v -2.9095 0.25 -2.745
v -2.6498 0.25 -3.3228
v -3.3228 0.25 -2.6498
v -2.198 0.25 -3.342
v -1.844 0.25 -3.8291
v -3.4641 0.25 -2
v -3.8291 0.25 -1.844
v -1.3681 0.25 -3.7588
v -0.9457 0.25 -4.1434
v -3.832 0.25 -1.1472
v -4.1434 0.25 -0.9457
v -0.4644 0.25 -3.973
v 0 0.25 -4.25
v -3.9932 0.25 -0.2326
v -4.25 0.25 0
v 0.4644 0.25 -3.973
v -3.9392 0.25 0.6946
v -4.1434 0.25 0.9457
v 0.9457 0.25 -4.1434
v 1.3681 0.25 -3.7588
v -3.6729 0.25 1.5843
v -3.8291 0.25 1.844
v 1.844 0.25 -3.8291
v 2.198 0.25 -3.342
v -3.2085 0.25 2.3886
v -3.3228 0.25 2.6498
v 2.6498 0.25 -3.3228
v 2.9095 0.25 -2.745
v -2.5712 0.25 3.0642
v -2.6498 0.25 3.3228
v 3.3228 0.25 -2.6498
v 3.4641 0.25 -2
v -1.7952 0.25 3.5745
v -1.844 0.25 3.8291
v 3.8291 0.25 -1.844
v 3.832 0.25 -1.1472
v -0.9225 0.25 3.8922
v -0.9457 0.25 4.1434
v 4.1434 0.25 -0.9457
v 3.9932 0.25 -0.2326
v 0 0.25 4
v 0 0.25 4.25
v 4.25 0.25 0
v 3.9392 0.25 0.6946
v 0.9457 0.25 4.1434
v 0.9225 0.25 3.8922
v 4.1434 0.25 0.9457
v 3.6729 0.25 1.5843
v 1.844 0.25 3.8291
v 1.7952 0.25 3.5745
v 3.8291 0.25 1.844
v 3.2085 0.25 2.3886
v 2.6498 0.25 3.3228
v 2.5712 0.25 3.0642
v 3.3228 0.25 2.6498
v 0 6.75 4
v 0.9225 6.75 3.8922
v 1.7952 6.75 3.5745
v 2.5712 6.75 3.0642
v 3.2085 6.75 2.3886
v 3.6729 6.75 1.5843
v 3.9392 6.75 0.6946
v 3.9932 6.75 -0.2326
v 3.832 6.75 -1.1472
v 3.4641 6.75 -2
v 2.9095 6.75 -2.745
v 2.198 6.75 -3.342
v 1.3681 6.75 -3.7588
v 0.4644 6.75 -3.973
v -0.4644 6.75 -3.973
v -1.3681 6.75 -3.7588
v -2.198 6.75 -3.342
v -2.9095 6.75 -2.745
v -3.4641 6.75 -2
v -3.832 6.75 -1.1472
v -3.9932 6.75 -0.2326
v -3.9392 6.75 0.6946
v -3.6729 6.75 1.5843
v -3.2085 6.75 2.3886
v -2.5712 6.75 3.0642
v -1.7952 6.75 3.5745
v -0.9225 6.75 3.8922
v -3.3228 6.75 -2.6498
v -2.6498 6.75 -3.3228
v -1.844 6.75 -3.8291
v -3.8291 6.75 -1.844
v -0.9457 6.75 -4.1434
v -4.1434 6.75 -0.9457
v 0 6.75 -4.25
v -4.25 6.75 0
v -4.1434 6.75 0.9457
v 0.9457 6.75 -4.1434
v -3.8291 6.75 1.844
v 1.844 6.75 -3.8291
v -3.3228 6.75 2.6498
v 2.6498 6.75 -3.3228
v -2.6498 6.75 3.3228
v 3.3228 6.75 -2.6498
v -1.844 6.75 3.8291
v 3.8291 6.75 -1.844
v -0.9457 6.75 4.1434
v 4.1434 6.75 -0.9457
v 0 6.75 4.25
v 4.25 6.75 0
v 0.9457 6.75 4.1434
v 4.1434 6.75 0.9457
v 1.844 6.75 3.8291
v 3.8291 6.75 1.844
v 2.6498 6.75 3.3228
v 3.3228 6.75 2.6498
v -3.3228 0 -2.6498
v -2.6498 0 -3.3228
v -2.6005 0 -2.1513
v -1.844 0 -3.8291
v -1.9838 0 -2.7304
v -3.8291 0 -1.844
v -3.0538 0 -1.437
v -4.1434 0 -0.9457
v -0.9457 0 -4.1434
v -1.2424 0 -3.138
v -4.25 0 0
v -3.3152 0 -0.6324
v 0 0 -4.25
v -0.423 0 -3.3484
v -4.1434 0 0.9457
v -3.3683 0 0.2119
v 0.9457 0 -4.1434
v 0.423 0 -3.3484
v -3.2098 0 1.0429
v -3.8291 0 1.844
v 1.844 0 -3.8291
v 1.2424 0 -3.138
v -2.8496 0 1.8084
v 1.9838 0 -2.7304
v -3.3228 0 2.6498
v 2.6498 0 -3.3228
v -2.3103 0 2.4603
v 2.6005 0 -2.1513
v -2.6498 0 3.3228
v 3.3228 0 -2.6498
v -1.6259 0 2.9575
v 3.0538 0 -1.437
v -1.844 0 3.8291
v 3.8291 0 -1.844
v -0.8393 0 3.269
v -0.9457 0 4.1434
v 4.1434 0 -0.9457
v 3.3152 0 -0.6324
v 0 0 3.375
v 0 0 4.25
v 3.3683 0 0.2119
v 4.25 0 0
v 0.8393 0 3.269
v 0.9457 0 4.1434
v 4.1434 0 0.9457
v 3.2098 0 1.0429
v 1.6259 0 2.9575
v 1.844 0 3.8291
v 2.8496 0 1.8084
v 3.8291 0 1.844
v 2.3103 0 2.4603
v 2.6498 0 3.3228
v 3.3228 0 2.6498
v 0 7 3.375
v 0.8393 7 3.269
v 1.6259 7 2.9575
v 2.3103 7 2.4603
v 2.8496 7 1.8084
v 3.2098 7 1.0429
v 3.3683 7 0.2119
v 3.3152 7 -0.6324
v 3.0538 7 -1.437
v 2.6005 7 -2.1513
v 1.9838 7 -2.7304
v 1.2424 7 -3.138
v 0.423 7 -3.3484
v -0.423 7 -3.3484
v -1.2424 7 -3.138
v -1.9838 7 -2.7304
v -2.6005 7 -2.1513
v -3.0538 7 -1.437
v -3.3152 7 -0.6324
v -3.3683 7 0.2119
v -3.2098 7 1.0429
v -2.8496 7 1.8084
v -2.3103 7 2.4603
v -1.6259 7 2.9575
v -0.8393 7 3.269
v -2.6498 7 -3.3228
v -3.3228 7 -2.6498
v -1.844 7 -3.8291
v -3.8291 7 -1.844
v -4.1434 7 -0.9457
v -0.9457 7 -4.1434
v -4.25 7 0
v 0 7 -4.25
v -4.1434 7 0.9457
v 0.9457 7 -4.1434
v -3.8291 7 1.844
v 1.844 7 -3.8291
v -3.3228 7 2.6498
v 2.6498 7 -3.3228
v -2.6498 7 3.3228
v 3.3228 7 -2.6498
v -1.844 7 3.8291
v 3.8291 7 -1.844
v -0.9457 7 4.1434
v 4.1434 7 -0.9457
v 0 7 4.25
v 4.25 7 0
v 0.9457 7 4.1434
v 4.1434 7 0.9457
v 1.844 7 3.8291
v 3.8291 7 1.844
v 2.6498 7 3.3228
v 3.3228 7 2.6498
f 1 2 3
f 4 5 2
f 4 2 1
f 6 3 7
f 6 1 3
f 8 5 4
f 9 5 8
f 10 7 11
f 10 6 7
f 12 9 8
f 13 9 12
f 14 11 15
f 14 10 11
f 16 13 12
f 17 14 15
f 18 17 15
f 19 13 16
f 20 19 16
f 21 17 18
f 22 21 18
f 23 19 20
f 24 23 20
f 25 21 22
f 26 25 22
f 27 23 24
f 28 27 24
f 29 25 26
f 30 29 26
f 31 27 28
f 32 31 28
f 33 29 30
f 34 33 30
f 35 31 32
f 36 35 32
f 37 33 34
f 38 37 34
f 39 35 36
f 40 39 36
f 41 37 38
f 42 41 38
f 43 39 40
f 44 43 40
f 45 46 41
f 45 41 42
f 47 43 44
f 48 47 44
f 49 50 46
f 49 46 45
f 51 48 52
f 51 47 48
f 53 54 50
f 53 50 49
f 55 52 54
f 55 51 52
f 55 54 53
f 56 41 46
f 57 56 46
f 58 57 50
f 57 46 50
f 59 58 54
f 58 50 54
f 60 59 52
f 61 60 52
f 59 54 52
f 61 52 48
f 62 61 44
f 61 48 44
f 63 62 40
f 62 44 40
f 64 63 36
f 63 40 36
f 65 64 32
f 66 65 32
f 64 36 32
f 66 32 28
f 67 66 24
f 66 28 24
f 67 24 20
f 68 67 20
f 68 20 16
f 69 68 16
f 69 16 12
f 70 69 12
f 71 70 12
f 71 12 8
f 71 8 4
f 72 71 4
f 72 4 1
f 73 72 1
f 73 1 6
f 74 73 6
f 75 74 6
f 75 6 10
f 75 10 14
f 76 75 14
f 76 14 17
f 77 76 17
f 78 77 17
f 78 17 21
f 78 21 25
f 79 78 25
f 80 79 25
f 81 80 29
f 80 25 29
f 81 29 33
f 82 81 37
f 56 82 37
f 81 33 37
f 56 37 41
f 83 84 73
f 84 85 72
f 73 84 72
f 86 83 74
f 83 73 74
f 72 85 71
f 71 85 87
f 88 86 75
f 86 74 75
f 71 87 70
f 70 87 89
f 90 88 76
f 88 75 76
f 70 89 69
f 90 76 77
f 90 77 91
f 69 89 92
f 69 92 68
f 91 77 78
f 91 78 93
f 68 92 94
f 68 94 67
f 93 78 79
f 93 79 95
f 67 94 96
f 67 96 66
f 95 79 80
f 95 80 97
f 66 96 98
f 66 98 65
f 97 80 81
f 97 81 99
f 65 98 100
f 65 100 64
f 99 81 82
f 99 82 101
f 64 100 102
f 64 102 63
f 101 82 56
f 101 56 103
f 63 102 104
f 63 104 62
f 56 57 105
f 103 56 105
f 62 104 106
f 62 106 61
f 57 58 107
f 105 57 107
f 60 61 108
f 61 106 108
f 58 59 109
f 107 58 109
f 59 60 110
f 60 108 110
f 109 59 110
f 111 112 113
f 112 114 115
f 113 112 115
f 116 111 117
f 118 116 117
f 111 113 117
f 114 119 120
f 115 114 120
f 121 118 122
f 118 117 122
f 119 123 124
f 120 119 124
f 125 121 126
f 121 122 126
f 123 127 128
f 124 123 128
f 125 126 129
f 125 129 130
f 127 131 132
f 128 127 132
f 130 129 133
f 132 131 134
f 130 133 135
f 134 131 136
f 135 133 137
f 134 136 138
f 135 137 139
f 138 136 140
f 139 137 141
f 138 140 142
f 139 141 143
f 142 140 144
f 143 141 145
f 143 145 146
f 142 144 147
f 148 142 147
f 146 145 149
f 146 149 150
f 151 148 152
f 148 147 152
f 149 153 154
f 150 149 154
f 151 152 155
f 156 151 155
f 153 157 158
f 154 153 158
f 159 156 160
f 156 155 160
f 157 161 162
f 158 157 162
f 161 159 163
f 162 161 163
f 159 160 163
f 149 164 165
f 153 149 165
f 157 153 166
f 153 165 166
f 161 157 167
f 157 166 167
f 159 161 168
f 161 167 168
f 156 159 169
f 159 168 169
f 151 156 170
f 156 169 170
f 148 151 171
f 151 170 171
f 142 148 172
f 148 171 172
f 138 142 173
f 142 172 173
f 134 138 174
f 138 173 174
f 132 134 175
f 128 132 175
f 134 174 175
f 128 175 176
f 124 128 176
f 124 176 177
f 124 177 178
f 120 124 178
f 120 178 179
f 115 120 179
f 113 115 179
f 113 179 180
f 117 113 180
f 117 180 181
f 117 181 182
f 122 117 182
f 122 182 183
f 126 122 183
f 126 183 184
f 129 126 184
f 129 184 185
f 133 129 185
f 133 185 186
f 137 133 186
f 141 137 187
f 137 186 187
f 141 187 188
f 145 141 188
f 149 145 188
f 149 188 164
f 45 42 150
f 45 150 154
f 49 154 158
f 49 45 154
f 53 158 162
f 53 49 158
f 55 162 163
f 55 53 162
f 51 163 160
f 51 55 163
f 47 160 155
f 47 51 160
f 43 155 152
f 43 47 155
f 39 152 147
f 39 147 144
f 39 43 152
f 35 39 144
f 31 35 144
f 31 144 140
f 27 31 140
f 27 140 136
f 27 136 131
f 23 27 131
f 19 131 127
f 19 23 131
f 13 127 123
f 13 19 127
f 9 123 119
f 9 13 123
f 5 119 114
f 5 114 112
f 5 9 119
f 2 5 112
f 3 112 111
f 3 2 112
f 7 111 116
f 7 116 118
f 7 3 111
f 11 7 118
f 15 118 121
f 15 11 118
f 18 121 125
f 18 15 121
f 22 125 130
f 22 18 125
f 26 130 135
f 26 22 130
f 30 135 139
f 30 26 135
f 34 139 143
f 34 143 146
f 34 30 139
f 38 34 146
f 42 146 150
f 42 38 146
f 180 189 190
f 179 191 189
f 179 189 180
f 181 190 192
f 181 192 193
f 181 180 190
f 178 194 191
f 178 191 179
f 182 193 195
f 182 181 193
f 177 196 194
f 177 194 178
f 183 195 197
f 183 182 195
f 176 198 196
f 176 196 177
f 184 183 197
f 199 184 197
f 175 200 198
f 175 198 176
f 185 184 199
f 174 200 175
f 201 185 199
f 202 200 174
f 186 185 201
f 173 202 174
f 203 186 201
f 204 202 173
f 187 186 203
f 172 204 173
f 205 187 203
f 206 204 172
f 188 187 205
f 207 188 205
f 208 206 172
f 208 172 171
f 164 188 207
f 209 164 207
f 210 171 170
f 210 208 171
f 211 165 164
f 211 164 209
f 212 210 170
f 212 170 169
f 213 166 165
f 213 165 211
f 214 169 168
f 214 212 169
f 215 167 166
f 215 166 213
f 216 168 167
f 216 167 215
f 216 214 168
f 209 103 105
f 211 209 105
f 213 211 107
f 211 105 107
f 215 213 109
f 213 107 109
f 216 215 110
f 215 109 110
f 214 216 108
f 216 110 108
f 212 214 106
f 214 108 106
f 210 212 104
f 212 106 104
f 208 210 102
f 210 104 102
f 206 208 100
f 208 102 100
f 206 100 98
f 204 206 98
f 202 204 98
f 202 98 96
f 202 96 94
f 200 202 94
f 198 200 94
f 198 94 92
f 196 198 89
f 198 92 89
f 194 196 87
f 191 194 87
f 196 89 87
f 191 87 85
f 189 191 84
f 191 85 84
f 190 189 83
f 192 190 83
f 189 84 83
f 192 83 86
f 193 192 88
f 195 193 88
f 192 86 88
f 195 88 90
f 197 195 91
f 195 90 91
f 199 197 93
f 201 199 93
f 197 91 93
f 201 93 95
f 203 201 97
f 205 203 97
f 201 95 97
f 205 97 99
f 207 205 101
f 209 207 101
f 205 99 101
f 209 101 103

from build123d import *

# Parameters (mm, degrees)
SKETCH1_R           = 4
BOSS_EXTRUDE1_DEPTH = 7
SKETCH2_R           = 3.375
CUT_EXTRUDE1_DEPTH  = 10
BOSS_EXTRUDE2_START = -0.25
SKETCH16_R          = 4.25
SKETCH16_R_2        = 4
BOSS_EXTRUDE2_DEPTH = 0.25


with BuildPart() as part:
    # Sketch1 → Boss-Extrude1 (new body)
    with BuildSketch(Plane(origin=(0, 0, 0), x_dir=(1, 0, 0), z_dir=(0, 1, 0))):
        with Locations(Location((0, 0, 0), (0, 0, 270))):
            Circle(SKETCH1_R)
    extrude(amount=BOSS_EXTRUDE1_DEPTH)

    # Sketch2 → Cut-Extrude1 (cut)
    with BuildSketch(Plane(origin=(0, 7, 0), x_dir=(1, 0, 0), z_dir=(0, 1, 0))):
        with Locations(Location((0, 0, 0), (0, 0, 270))):
            Circle(SKETCH2_R)
    extrude(amount=-CUT_EXTRUDE1_DEPTH, mode=Mode.SUBTRACT)

    # Sketch16 → Boss-Extrude2 (add)
    with BuildSketch(Plane(origin=(0, 7, 0), x_dir=(1, 0, 0), z_dir=(0, 1, 0)).offset(BOSS_EXTRUDE2_START)):
        with Locations(Location((0, 0, 0), (0, 0, 270))):
            Circle(SKETCH16_R)
        with Locations(Location((0, 0, 0), (0, 0, 270))):
            Circle(SKETCH16_R_2, mode=Mode.SUBTRACT)
    boss_extrude2 = extrude(amount=BOSS_EXTRUDE2_DEPTH)

    # Mirror1: Boss-Extrude2 across plane
    add(boss_extrude2.mirror(Plane.ZX.offset(3.5)))


solid = part.part
